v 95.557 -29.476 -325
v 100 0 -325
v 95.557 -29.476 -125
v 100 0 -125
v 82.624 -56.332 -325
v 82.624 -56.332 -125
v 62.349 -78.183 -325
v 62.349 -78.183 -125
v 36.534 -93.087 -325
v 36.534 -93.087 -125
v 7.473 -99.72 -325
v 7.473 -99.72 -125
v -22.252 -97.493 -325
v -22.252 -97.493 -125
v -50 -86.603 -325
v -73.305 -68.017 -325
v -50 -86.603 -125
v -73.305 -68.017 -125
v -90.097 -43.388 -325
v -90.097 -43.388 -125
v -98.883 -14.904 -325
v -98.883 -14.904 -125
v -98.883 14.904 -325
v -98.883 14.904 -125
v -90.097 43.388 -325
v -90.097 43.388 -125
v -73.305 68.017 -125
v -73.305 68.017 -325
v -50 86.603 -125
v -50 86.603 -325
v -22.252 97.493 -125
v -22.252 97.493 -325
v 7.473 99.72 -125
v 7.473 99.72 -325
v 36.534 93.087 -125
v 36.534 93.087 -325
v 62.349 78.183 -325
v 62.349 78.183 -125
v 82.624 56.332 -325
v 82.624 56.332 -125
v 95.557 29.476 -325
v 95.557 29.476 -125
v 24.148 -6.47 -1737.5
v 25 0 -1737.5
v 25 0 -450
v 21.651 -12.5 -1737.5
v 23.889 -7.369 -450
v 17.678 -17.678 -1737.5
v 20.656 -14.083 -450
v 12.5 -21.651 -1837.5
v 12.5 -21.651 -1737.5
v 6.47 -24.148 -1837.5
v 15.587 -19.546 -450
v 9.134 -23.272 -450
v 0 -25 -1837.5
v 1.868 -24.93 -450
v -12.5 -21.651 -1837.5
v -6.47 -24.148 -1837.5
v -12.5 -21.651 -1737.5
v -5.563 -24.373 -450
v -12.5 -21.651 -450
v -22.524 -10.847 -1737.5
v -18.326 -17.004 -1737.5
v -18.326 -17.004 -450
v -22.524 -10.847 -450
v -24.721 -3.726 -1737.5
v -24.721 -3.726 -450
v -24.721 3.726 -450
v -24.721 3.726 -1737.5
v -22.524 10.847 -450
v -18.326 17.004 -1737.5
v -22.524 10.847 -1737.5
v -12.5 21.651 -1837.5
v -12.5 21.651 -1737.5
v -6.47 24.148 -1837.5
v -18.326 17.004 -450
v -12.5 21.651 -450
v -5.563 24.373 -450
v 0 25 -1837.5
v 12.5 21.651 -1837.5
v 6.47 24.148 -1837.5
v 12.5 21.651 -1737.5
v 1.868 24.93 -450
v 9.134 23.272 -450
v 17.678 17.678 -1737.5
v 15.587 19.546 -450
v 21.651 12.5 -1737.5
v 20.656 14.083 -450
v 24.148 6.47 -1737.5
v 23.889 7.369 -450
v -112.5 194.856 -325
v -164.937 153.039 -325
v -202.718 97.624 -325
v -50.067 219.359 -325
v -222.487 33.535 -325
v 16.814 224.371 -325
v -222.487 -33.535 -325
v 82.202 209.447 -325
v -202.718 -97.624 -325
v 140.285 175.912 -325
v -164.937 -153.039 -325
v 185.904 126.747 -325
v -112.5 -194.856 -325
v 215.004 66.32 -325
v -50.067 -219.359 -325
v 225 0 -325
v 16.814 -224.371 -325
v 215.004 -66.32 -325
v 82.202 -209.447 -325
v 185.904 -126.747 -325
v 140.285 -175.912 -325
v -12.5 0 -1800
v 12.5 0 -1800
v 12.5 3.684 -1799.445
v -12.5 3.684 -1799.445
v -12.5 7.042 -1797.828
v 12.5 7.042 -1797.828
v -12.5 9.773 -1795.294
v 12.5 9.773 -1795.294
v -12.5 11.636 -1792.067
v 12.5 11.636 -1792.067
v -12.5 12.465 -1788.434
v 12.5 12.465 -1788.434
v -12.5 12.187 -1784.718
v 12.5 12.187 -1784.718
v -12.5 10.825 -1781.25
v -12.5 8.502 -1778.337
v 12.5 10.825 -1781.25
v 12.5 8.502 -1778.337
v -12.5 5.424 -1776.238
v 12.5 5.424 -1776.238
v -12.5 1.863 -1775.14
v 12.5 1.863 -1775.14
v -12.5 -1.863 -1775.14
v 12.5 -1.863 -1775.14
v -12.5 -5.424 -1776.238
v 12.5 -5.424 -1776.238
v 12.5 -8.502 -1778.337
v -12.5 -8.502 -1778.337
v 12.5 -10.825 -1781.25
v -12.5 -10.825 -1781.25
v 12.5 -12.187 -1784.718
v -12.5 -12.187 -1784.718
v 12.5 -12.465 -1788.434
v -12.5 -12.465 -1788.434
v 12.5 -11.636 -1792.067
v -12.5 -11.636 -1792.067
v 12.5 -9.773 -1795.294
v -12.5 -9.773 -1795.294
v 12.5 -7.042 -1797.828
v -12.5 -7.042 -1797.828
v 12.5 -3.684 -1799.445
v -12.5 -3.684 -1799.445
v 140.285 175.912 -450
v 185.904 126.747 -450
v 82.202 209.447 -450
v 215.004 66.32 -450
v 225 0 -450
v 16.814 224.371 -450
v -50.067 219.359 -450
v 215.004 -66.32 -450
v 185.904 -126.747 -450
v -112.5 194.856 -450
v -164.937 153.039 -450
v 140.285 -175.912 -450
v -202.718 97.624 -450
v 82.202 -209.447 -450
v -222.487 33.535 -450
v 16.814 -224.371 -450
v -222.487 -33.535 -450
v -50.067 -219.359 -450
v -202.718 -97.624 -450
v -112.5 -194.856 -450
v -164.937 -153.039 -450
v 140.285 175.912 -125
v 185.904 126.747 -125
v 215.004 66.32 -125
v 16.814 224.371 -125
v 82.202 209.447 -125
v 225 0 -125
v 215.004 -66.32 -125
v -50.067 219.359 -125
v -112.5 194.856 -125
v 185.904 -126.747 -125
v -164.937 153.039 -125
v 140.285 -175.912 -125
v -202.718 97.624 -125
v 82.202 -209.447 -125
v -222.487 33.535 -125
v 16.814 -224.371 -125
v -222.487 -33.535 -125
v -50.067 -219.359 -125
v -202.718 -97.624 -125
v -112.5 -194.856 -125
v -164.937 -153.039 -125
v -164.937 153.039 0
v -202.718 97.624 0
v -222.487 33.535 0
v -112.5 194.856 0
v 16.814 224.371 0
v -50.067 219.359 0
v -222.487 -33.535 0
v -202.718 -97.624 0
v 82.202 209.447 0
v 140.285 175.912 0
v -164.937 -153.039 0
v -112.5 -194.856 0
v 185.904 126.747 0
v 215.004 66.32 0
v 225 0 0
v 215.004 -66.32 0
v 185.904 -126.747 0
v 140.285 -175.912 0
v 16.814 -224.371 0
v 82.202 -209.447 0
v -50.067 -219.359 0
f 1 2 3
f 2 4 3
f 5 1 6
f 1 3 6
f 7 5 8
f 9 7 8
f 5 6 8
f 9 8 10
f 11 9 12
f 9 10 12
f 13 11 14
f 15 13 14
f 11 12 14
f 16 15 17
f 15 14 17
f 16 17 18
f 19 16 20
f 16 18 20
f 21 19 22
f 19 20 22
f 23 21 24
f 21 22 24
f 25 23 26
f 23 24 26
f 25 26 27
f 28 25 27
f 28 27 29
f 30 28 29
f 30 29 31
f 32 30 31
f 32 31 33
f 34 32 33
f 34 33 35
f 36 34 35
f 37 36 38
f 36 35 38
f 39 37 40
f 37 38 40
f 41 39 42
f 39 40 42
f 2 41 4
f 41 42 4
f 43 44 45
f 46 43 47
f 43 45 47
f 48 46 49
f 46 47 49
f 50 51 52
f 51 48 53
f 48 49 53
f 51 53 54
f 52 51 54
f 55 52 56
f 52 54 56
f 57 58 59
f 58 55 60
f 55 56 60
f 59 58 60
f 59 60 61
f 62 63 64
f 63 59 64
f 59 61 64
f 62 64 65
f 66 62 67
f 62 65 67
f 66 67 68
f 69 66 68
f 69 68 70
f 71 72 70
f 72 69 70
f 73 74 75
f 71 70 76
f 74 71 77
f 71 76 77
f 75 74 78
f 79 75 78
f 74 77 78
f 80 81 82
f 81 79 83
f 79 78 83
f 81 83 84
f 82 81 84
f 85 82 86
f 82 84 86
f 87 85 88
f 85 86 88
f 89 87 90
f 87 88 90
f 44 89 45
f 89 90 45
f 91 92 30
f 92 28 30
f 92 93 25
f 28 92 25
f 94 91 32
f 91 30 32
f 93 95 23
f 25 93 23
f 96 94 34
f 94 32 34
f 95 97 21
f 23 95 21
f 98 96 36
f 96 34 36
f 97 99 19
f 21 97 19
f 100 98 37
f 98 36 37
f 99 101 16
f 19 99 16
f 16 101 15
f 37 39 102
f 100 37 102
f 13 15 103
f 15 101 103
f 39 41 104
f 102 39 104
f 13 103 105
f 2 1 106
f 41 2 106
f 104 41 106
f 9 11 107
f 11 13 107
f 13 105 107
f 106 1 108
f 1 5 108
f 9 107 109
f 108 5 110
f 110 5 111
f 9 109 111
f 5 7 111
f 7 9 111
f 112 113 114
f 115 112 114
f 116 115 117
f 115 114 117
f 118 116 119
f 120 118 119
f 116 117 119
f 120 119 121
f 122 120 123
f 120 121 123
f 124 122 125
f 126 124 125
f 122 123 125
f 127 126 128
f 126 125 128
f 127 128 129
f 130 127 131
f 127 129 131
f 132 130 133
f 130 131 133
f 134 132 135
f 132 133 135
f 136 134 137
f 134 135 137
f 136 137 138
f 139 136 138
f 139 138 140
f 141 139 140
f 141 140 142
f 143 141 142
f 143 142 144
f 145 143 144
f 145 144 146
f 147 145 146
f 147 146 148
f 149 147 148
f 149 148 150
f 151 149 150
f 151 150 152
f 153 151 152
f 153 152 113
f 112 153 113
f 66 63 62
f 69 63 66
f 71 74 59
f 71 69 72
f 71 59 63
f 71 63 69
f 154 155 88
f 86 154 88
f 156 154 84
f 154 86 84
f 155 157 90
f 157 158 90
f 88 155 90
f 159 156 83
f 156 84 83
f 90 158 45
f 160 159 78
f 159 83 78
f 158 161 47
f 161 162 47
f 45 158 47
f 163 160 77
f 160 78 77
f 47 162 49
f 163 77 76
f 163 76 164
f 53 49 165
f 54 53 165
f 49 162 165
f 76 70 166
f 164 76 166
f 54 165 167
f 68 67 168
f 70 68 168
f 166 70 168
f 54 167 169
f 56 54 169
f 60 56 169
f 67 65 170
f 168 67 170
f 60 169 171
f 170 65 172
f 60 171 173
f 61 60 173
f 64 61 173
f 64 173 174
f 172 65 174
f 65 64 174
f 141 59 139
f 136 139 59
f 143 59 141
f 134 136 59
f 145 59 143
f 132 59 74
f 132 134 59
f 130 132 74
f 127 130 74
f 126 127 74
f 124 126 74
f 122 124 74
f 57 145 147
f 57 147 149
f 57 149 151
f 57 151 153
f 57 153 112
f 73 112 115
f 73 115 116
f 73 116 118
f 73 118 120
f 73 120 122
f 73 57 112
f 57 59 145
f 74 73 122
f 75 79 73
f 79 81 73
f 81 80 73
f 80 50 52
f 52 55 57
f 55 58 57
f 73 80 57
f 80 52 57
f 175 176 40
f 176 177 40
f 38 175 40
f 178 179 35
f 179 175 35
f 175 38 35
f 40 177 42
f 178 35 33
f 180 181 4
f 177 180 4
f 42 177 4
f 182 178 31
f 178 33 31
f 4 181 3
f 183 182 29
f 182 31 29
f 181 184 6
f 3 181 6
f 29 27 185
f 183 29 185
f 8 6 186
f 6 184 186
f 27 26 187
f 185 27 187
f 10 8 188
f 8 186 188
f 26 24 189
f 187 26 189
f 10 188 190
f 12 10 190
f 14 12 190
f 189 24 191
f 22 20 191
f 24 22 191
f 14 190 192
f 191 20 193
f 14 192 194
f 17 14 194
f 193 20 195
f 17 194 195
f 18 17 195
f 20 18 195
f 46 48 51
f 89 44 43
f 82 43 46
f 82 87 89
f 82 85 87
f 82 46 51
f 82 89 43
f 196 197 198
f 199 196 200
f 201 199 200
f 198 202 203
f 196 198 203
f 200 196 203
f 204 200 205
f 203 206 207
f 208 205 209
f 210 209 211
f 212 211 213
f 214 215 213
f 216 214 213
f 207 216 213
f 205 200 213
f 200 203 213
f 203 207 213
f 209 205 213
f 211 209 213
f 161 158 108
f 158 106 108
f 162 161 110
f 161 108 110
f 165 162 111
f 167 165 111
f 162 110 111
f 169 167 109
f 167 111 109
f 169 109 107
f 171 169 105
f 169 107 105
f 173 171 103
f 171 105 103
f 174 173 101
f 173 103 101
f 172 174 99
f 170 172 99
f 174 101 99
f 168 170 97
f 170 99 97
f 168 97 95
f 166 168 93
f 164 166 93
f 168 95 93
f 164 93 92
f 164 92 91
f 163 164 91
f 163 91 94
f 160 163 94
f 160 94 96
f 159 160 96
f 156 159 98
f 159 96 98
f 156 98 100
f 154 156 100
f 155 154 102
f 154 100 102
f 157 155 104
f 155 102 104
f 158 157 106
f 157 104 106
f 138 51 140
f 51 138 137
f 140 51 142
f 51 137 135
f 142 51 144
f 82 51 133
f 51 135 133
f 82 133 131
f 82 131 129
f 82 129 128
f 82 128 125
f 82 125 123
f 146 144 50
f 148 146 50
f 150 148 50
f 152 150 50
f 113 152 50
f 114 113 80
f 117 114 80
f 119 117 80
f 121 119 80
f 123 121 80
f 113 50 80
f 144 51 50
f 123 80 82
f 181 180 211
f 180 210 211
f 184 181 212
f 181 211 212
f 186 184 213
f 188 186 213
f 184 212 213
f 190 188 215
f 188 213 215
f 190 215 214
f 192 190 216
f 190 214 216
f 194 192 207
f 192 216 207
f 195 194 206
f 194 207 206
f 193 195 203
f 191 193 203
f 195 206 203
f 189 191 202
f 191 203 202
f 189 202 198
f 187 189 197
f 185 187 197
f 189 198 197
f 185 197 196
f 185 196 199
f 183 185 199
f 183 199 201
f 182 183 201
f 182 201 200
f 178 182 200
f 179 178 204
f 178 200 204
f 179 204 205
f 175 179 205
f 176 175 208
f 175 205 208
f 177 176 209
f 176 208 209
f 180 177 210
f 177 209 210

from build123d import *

# Parameters (mm, degrees)
SKETCH2_W          = 32.050318883
SKETCH2_H          = 65.476021051
SKETCH2_W_2        = 24.596756352
SKETCH2_H_2        = 67.490667853
CUT_EXTRUDE1_DEPTH = 100
CUT_EXTRUDE2_REACH = 1868.397
SKETCH3_R          = 12.5


with BuildPart() as part:
    # Sketch1 → Revolve1 (revolve)
    with BuildSketch(Plane(origin=(0, 0, 0), x_dir=(0, 0, -1), z_dir=(1, 0, 0)), mode=Mode.PRIVATE) as revolve1_sk:
        Polygon((0, 0), (1837.5, 0), (1837.5, -25), (450, -25), (450, -225), (325, -225), (325, -100), (125, -100), (125, -225), (0, -225), align=None)
    revolve(revolve1_sk.sketch.rotate(Axis((0, 0, 0), (0, 0, -1)), 270), axis=Axis((0, 0, 0), (0, 0, -1)))

    # Sketch2 → Cut-Extrude1 (cut)
    with BuildSketch(Plane(origin=(0, 0, -1837.5), x_dir=(-1, 0, 0), z_dir=(0, 0, -1))):
        with Locations((-28.525159442, 1.561413984)):
            Rectangle(SKETCH2_W, SKETCH2_H)
        with Locations((24.798378176, 2.232962919)):
            Rectangle(SKETCH2_W_2, SKETCH2_H_2)
    extrude(amount=-CUT_EXTRUDE1_DEPTH, mode=Mode.SUBTRACT)

    # Sketch3 → Cut-Extrude2 (cut, up to next)
    with BuildSketch(Plane(origin=(12.5, 0, 0), x_dir=(0, 0, -1), z_dir=(1, 0, 0)), mode=Mode.PRIVATE) as cut_extrude2_sk1:
        with Locations((1787.5, 0)):
            Circle(SKETCH3_R)
    cut_extrude2_tool1 = extrude(cut_extrude2_sk1.sketch, amount=-CUT_EXTRUDE2_REACH, mode=Mode.PRIVATE) & part.part
    add(cut_extrude2_tool1.solids().sort_by_distance((12.5, 0, -1787.5))[0], mode=Mode.SUBTRACT)


solid = part.part
